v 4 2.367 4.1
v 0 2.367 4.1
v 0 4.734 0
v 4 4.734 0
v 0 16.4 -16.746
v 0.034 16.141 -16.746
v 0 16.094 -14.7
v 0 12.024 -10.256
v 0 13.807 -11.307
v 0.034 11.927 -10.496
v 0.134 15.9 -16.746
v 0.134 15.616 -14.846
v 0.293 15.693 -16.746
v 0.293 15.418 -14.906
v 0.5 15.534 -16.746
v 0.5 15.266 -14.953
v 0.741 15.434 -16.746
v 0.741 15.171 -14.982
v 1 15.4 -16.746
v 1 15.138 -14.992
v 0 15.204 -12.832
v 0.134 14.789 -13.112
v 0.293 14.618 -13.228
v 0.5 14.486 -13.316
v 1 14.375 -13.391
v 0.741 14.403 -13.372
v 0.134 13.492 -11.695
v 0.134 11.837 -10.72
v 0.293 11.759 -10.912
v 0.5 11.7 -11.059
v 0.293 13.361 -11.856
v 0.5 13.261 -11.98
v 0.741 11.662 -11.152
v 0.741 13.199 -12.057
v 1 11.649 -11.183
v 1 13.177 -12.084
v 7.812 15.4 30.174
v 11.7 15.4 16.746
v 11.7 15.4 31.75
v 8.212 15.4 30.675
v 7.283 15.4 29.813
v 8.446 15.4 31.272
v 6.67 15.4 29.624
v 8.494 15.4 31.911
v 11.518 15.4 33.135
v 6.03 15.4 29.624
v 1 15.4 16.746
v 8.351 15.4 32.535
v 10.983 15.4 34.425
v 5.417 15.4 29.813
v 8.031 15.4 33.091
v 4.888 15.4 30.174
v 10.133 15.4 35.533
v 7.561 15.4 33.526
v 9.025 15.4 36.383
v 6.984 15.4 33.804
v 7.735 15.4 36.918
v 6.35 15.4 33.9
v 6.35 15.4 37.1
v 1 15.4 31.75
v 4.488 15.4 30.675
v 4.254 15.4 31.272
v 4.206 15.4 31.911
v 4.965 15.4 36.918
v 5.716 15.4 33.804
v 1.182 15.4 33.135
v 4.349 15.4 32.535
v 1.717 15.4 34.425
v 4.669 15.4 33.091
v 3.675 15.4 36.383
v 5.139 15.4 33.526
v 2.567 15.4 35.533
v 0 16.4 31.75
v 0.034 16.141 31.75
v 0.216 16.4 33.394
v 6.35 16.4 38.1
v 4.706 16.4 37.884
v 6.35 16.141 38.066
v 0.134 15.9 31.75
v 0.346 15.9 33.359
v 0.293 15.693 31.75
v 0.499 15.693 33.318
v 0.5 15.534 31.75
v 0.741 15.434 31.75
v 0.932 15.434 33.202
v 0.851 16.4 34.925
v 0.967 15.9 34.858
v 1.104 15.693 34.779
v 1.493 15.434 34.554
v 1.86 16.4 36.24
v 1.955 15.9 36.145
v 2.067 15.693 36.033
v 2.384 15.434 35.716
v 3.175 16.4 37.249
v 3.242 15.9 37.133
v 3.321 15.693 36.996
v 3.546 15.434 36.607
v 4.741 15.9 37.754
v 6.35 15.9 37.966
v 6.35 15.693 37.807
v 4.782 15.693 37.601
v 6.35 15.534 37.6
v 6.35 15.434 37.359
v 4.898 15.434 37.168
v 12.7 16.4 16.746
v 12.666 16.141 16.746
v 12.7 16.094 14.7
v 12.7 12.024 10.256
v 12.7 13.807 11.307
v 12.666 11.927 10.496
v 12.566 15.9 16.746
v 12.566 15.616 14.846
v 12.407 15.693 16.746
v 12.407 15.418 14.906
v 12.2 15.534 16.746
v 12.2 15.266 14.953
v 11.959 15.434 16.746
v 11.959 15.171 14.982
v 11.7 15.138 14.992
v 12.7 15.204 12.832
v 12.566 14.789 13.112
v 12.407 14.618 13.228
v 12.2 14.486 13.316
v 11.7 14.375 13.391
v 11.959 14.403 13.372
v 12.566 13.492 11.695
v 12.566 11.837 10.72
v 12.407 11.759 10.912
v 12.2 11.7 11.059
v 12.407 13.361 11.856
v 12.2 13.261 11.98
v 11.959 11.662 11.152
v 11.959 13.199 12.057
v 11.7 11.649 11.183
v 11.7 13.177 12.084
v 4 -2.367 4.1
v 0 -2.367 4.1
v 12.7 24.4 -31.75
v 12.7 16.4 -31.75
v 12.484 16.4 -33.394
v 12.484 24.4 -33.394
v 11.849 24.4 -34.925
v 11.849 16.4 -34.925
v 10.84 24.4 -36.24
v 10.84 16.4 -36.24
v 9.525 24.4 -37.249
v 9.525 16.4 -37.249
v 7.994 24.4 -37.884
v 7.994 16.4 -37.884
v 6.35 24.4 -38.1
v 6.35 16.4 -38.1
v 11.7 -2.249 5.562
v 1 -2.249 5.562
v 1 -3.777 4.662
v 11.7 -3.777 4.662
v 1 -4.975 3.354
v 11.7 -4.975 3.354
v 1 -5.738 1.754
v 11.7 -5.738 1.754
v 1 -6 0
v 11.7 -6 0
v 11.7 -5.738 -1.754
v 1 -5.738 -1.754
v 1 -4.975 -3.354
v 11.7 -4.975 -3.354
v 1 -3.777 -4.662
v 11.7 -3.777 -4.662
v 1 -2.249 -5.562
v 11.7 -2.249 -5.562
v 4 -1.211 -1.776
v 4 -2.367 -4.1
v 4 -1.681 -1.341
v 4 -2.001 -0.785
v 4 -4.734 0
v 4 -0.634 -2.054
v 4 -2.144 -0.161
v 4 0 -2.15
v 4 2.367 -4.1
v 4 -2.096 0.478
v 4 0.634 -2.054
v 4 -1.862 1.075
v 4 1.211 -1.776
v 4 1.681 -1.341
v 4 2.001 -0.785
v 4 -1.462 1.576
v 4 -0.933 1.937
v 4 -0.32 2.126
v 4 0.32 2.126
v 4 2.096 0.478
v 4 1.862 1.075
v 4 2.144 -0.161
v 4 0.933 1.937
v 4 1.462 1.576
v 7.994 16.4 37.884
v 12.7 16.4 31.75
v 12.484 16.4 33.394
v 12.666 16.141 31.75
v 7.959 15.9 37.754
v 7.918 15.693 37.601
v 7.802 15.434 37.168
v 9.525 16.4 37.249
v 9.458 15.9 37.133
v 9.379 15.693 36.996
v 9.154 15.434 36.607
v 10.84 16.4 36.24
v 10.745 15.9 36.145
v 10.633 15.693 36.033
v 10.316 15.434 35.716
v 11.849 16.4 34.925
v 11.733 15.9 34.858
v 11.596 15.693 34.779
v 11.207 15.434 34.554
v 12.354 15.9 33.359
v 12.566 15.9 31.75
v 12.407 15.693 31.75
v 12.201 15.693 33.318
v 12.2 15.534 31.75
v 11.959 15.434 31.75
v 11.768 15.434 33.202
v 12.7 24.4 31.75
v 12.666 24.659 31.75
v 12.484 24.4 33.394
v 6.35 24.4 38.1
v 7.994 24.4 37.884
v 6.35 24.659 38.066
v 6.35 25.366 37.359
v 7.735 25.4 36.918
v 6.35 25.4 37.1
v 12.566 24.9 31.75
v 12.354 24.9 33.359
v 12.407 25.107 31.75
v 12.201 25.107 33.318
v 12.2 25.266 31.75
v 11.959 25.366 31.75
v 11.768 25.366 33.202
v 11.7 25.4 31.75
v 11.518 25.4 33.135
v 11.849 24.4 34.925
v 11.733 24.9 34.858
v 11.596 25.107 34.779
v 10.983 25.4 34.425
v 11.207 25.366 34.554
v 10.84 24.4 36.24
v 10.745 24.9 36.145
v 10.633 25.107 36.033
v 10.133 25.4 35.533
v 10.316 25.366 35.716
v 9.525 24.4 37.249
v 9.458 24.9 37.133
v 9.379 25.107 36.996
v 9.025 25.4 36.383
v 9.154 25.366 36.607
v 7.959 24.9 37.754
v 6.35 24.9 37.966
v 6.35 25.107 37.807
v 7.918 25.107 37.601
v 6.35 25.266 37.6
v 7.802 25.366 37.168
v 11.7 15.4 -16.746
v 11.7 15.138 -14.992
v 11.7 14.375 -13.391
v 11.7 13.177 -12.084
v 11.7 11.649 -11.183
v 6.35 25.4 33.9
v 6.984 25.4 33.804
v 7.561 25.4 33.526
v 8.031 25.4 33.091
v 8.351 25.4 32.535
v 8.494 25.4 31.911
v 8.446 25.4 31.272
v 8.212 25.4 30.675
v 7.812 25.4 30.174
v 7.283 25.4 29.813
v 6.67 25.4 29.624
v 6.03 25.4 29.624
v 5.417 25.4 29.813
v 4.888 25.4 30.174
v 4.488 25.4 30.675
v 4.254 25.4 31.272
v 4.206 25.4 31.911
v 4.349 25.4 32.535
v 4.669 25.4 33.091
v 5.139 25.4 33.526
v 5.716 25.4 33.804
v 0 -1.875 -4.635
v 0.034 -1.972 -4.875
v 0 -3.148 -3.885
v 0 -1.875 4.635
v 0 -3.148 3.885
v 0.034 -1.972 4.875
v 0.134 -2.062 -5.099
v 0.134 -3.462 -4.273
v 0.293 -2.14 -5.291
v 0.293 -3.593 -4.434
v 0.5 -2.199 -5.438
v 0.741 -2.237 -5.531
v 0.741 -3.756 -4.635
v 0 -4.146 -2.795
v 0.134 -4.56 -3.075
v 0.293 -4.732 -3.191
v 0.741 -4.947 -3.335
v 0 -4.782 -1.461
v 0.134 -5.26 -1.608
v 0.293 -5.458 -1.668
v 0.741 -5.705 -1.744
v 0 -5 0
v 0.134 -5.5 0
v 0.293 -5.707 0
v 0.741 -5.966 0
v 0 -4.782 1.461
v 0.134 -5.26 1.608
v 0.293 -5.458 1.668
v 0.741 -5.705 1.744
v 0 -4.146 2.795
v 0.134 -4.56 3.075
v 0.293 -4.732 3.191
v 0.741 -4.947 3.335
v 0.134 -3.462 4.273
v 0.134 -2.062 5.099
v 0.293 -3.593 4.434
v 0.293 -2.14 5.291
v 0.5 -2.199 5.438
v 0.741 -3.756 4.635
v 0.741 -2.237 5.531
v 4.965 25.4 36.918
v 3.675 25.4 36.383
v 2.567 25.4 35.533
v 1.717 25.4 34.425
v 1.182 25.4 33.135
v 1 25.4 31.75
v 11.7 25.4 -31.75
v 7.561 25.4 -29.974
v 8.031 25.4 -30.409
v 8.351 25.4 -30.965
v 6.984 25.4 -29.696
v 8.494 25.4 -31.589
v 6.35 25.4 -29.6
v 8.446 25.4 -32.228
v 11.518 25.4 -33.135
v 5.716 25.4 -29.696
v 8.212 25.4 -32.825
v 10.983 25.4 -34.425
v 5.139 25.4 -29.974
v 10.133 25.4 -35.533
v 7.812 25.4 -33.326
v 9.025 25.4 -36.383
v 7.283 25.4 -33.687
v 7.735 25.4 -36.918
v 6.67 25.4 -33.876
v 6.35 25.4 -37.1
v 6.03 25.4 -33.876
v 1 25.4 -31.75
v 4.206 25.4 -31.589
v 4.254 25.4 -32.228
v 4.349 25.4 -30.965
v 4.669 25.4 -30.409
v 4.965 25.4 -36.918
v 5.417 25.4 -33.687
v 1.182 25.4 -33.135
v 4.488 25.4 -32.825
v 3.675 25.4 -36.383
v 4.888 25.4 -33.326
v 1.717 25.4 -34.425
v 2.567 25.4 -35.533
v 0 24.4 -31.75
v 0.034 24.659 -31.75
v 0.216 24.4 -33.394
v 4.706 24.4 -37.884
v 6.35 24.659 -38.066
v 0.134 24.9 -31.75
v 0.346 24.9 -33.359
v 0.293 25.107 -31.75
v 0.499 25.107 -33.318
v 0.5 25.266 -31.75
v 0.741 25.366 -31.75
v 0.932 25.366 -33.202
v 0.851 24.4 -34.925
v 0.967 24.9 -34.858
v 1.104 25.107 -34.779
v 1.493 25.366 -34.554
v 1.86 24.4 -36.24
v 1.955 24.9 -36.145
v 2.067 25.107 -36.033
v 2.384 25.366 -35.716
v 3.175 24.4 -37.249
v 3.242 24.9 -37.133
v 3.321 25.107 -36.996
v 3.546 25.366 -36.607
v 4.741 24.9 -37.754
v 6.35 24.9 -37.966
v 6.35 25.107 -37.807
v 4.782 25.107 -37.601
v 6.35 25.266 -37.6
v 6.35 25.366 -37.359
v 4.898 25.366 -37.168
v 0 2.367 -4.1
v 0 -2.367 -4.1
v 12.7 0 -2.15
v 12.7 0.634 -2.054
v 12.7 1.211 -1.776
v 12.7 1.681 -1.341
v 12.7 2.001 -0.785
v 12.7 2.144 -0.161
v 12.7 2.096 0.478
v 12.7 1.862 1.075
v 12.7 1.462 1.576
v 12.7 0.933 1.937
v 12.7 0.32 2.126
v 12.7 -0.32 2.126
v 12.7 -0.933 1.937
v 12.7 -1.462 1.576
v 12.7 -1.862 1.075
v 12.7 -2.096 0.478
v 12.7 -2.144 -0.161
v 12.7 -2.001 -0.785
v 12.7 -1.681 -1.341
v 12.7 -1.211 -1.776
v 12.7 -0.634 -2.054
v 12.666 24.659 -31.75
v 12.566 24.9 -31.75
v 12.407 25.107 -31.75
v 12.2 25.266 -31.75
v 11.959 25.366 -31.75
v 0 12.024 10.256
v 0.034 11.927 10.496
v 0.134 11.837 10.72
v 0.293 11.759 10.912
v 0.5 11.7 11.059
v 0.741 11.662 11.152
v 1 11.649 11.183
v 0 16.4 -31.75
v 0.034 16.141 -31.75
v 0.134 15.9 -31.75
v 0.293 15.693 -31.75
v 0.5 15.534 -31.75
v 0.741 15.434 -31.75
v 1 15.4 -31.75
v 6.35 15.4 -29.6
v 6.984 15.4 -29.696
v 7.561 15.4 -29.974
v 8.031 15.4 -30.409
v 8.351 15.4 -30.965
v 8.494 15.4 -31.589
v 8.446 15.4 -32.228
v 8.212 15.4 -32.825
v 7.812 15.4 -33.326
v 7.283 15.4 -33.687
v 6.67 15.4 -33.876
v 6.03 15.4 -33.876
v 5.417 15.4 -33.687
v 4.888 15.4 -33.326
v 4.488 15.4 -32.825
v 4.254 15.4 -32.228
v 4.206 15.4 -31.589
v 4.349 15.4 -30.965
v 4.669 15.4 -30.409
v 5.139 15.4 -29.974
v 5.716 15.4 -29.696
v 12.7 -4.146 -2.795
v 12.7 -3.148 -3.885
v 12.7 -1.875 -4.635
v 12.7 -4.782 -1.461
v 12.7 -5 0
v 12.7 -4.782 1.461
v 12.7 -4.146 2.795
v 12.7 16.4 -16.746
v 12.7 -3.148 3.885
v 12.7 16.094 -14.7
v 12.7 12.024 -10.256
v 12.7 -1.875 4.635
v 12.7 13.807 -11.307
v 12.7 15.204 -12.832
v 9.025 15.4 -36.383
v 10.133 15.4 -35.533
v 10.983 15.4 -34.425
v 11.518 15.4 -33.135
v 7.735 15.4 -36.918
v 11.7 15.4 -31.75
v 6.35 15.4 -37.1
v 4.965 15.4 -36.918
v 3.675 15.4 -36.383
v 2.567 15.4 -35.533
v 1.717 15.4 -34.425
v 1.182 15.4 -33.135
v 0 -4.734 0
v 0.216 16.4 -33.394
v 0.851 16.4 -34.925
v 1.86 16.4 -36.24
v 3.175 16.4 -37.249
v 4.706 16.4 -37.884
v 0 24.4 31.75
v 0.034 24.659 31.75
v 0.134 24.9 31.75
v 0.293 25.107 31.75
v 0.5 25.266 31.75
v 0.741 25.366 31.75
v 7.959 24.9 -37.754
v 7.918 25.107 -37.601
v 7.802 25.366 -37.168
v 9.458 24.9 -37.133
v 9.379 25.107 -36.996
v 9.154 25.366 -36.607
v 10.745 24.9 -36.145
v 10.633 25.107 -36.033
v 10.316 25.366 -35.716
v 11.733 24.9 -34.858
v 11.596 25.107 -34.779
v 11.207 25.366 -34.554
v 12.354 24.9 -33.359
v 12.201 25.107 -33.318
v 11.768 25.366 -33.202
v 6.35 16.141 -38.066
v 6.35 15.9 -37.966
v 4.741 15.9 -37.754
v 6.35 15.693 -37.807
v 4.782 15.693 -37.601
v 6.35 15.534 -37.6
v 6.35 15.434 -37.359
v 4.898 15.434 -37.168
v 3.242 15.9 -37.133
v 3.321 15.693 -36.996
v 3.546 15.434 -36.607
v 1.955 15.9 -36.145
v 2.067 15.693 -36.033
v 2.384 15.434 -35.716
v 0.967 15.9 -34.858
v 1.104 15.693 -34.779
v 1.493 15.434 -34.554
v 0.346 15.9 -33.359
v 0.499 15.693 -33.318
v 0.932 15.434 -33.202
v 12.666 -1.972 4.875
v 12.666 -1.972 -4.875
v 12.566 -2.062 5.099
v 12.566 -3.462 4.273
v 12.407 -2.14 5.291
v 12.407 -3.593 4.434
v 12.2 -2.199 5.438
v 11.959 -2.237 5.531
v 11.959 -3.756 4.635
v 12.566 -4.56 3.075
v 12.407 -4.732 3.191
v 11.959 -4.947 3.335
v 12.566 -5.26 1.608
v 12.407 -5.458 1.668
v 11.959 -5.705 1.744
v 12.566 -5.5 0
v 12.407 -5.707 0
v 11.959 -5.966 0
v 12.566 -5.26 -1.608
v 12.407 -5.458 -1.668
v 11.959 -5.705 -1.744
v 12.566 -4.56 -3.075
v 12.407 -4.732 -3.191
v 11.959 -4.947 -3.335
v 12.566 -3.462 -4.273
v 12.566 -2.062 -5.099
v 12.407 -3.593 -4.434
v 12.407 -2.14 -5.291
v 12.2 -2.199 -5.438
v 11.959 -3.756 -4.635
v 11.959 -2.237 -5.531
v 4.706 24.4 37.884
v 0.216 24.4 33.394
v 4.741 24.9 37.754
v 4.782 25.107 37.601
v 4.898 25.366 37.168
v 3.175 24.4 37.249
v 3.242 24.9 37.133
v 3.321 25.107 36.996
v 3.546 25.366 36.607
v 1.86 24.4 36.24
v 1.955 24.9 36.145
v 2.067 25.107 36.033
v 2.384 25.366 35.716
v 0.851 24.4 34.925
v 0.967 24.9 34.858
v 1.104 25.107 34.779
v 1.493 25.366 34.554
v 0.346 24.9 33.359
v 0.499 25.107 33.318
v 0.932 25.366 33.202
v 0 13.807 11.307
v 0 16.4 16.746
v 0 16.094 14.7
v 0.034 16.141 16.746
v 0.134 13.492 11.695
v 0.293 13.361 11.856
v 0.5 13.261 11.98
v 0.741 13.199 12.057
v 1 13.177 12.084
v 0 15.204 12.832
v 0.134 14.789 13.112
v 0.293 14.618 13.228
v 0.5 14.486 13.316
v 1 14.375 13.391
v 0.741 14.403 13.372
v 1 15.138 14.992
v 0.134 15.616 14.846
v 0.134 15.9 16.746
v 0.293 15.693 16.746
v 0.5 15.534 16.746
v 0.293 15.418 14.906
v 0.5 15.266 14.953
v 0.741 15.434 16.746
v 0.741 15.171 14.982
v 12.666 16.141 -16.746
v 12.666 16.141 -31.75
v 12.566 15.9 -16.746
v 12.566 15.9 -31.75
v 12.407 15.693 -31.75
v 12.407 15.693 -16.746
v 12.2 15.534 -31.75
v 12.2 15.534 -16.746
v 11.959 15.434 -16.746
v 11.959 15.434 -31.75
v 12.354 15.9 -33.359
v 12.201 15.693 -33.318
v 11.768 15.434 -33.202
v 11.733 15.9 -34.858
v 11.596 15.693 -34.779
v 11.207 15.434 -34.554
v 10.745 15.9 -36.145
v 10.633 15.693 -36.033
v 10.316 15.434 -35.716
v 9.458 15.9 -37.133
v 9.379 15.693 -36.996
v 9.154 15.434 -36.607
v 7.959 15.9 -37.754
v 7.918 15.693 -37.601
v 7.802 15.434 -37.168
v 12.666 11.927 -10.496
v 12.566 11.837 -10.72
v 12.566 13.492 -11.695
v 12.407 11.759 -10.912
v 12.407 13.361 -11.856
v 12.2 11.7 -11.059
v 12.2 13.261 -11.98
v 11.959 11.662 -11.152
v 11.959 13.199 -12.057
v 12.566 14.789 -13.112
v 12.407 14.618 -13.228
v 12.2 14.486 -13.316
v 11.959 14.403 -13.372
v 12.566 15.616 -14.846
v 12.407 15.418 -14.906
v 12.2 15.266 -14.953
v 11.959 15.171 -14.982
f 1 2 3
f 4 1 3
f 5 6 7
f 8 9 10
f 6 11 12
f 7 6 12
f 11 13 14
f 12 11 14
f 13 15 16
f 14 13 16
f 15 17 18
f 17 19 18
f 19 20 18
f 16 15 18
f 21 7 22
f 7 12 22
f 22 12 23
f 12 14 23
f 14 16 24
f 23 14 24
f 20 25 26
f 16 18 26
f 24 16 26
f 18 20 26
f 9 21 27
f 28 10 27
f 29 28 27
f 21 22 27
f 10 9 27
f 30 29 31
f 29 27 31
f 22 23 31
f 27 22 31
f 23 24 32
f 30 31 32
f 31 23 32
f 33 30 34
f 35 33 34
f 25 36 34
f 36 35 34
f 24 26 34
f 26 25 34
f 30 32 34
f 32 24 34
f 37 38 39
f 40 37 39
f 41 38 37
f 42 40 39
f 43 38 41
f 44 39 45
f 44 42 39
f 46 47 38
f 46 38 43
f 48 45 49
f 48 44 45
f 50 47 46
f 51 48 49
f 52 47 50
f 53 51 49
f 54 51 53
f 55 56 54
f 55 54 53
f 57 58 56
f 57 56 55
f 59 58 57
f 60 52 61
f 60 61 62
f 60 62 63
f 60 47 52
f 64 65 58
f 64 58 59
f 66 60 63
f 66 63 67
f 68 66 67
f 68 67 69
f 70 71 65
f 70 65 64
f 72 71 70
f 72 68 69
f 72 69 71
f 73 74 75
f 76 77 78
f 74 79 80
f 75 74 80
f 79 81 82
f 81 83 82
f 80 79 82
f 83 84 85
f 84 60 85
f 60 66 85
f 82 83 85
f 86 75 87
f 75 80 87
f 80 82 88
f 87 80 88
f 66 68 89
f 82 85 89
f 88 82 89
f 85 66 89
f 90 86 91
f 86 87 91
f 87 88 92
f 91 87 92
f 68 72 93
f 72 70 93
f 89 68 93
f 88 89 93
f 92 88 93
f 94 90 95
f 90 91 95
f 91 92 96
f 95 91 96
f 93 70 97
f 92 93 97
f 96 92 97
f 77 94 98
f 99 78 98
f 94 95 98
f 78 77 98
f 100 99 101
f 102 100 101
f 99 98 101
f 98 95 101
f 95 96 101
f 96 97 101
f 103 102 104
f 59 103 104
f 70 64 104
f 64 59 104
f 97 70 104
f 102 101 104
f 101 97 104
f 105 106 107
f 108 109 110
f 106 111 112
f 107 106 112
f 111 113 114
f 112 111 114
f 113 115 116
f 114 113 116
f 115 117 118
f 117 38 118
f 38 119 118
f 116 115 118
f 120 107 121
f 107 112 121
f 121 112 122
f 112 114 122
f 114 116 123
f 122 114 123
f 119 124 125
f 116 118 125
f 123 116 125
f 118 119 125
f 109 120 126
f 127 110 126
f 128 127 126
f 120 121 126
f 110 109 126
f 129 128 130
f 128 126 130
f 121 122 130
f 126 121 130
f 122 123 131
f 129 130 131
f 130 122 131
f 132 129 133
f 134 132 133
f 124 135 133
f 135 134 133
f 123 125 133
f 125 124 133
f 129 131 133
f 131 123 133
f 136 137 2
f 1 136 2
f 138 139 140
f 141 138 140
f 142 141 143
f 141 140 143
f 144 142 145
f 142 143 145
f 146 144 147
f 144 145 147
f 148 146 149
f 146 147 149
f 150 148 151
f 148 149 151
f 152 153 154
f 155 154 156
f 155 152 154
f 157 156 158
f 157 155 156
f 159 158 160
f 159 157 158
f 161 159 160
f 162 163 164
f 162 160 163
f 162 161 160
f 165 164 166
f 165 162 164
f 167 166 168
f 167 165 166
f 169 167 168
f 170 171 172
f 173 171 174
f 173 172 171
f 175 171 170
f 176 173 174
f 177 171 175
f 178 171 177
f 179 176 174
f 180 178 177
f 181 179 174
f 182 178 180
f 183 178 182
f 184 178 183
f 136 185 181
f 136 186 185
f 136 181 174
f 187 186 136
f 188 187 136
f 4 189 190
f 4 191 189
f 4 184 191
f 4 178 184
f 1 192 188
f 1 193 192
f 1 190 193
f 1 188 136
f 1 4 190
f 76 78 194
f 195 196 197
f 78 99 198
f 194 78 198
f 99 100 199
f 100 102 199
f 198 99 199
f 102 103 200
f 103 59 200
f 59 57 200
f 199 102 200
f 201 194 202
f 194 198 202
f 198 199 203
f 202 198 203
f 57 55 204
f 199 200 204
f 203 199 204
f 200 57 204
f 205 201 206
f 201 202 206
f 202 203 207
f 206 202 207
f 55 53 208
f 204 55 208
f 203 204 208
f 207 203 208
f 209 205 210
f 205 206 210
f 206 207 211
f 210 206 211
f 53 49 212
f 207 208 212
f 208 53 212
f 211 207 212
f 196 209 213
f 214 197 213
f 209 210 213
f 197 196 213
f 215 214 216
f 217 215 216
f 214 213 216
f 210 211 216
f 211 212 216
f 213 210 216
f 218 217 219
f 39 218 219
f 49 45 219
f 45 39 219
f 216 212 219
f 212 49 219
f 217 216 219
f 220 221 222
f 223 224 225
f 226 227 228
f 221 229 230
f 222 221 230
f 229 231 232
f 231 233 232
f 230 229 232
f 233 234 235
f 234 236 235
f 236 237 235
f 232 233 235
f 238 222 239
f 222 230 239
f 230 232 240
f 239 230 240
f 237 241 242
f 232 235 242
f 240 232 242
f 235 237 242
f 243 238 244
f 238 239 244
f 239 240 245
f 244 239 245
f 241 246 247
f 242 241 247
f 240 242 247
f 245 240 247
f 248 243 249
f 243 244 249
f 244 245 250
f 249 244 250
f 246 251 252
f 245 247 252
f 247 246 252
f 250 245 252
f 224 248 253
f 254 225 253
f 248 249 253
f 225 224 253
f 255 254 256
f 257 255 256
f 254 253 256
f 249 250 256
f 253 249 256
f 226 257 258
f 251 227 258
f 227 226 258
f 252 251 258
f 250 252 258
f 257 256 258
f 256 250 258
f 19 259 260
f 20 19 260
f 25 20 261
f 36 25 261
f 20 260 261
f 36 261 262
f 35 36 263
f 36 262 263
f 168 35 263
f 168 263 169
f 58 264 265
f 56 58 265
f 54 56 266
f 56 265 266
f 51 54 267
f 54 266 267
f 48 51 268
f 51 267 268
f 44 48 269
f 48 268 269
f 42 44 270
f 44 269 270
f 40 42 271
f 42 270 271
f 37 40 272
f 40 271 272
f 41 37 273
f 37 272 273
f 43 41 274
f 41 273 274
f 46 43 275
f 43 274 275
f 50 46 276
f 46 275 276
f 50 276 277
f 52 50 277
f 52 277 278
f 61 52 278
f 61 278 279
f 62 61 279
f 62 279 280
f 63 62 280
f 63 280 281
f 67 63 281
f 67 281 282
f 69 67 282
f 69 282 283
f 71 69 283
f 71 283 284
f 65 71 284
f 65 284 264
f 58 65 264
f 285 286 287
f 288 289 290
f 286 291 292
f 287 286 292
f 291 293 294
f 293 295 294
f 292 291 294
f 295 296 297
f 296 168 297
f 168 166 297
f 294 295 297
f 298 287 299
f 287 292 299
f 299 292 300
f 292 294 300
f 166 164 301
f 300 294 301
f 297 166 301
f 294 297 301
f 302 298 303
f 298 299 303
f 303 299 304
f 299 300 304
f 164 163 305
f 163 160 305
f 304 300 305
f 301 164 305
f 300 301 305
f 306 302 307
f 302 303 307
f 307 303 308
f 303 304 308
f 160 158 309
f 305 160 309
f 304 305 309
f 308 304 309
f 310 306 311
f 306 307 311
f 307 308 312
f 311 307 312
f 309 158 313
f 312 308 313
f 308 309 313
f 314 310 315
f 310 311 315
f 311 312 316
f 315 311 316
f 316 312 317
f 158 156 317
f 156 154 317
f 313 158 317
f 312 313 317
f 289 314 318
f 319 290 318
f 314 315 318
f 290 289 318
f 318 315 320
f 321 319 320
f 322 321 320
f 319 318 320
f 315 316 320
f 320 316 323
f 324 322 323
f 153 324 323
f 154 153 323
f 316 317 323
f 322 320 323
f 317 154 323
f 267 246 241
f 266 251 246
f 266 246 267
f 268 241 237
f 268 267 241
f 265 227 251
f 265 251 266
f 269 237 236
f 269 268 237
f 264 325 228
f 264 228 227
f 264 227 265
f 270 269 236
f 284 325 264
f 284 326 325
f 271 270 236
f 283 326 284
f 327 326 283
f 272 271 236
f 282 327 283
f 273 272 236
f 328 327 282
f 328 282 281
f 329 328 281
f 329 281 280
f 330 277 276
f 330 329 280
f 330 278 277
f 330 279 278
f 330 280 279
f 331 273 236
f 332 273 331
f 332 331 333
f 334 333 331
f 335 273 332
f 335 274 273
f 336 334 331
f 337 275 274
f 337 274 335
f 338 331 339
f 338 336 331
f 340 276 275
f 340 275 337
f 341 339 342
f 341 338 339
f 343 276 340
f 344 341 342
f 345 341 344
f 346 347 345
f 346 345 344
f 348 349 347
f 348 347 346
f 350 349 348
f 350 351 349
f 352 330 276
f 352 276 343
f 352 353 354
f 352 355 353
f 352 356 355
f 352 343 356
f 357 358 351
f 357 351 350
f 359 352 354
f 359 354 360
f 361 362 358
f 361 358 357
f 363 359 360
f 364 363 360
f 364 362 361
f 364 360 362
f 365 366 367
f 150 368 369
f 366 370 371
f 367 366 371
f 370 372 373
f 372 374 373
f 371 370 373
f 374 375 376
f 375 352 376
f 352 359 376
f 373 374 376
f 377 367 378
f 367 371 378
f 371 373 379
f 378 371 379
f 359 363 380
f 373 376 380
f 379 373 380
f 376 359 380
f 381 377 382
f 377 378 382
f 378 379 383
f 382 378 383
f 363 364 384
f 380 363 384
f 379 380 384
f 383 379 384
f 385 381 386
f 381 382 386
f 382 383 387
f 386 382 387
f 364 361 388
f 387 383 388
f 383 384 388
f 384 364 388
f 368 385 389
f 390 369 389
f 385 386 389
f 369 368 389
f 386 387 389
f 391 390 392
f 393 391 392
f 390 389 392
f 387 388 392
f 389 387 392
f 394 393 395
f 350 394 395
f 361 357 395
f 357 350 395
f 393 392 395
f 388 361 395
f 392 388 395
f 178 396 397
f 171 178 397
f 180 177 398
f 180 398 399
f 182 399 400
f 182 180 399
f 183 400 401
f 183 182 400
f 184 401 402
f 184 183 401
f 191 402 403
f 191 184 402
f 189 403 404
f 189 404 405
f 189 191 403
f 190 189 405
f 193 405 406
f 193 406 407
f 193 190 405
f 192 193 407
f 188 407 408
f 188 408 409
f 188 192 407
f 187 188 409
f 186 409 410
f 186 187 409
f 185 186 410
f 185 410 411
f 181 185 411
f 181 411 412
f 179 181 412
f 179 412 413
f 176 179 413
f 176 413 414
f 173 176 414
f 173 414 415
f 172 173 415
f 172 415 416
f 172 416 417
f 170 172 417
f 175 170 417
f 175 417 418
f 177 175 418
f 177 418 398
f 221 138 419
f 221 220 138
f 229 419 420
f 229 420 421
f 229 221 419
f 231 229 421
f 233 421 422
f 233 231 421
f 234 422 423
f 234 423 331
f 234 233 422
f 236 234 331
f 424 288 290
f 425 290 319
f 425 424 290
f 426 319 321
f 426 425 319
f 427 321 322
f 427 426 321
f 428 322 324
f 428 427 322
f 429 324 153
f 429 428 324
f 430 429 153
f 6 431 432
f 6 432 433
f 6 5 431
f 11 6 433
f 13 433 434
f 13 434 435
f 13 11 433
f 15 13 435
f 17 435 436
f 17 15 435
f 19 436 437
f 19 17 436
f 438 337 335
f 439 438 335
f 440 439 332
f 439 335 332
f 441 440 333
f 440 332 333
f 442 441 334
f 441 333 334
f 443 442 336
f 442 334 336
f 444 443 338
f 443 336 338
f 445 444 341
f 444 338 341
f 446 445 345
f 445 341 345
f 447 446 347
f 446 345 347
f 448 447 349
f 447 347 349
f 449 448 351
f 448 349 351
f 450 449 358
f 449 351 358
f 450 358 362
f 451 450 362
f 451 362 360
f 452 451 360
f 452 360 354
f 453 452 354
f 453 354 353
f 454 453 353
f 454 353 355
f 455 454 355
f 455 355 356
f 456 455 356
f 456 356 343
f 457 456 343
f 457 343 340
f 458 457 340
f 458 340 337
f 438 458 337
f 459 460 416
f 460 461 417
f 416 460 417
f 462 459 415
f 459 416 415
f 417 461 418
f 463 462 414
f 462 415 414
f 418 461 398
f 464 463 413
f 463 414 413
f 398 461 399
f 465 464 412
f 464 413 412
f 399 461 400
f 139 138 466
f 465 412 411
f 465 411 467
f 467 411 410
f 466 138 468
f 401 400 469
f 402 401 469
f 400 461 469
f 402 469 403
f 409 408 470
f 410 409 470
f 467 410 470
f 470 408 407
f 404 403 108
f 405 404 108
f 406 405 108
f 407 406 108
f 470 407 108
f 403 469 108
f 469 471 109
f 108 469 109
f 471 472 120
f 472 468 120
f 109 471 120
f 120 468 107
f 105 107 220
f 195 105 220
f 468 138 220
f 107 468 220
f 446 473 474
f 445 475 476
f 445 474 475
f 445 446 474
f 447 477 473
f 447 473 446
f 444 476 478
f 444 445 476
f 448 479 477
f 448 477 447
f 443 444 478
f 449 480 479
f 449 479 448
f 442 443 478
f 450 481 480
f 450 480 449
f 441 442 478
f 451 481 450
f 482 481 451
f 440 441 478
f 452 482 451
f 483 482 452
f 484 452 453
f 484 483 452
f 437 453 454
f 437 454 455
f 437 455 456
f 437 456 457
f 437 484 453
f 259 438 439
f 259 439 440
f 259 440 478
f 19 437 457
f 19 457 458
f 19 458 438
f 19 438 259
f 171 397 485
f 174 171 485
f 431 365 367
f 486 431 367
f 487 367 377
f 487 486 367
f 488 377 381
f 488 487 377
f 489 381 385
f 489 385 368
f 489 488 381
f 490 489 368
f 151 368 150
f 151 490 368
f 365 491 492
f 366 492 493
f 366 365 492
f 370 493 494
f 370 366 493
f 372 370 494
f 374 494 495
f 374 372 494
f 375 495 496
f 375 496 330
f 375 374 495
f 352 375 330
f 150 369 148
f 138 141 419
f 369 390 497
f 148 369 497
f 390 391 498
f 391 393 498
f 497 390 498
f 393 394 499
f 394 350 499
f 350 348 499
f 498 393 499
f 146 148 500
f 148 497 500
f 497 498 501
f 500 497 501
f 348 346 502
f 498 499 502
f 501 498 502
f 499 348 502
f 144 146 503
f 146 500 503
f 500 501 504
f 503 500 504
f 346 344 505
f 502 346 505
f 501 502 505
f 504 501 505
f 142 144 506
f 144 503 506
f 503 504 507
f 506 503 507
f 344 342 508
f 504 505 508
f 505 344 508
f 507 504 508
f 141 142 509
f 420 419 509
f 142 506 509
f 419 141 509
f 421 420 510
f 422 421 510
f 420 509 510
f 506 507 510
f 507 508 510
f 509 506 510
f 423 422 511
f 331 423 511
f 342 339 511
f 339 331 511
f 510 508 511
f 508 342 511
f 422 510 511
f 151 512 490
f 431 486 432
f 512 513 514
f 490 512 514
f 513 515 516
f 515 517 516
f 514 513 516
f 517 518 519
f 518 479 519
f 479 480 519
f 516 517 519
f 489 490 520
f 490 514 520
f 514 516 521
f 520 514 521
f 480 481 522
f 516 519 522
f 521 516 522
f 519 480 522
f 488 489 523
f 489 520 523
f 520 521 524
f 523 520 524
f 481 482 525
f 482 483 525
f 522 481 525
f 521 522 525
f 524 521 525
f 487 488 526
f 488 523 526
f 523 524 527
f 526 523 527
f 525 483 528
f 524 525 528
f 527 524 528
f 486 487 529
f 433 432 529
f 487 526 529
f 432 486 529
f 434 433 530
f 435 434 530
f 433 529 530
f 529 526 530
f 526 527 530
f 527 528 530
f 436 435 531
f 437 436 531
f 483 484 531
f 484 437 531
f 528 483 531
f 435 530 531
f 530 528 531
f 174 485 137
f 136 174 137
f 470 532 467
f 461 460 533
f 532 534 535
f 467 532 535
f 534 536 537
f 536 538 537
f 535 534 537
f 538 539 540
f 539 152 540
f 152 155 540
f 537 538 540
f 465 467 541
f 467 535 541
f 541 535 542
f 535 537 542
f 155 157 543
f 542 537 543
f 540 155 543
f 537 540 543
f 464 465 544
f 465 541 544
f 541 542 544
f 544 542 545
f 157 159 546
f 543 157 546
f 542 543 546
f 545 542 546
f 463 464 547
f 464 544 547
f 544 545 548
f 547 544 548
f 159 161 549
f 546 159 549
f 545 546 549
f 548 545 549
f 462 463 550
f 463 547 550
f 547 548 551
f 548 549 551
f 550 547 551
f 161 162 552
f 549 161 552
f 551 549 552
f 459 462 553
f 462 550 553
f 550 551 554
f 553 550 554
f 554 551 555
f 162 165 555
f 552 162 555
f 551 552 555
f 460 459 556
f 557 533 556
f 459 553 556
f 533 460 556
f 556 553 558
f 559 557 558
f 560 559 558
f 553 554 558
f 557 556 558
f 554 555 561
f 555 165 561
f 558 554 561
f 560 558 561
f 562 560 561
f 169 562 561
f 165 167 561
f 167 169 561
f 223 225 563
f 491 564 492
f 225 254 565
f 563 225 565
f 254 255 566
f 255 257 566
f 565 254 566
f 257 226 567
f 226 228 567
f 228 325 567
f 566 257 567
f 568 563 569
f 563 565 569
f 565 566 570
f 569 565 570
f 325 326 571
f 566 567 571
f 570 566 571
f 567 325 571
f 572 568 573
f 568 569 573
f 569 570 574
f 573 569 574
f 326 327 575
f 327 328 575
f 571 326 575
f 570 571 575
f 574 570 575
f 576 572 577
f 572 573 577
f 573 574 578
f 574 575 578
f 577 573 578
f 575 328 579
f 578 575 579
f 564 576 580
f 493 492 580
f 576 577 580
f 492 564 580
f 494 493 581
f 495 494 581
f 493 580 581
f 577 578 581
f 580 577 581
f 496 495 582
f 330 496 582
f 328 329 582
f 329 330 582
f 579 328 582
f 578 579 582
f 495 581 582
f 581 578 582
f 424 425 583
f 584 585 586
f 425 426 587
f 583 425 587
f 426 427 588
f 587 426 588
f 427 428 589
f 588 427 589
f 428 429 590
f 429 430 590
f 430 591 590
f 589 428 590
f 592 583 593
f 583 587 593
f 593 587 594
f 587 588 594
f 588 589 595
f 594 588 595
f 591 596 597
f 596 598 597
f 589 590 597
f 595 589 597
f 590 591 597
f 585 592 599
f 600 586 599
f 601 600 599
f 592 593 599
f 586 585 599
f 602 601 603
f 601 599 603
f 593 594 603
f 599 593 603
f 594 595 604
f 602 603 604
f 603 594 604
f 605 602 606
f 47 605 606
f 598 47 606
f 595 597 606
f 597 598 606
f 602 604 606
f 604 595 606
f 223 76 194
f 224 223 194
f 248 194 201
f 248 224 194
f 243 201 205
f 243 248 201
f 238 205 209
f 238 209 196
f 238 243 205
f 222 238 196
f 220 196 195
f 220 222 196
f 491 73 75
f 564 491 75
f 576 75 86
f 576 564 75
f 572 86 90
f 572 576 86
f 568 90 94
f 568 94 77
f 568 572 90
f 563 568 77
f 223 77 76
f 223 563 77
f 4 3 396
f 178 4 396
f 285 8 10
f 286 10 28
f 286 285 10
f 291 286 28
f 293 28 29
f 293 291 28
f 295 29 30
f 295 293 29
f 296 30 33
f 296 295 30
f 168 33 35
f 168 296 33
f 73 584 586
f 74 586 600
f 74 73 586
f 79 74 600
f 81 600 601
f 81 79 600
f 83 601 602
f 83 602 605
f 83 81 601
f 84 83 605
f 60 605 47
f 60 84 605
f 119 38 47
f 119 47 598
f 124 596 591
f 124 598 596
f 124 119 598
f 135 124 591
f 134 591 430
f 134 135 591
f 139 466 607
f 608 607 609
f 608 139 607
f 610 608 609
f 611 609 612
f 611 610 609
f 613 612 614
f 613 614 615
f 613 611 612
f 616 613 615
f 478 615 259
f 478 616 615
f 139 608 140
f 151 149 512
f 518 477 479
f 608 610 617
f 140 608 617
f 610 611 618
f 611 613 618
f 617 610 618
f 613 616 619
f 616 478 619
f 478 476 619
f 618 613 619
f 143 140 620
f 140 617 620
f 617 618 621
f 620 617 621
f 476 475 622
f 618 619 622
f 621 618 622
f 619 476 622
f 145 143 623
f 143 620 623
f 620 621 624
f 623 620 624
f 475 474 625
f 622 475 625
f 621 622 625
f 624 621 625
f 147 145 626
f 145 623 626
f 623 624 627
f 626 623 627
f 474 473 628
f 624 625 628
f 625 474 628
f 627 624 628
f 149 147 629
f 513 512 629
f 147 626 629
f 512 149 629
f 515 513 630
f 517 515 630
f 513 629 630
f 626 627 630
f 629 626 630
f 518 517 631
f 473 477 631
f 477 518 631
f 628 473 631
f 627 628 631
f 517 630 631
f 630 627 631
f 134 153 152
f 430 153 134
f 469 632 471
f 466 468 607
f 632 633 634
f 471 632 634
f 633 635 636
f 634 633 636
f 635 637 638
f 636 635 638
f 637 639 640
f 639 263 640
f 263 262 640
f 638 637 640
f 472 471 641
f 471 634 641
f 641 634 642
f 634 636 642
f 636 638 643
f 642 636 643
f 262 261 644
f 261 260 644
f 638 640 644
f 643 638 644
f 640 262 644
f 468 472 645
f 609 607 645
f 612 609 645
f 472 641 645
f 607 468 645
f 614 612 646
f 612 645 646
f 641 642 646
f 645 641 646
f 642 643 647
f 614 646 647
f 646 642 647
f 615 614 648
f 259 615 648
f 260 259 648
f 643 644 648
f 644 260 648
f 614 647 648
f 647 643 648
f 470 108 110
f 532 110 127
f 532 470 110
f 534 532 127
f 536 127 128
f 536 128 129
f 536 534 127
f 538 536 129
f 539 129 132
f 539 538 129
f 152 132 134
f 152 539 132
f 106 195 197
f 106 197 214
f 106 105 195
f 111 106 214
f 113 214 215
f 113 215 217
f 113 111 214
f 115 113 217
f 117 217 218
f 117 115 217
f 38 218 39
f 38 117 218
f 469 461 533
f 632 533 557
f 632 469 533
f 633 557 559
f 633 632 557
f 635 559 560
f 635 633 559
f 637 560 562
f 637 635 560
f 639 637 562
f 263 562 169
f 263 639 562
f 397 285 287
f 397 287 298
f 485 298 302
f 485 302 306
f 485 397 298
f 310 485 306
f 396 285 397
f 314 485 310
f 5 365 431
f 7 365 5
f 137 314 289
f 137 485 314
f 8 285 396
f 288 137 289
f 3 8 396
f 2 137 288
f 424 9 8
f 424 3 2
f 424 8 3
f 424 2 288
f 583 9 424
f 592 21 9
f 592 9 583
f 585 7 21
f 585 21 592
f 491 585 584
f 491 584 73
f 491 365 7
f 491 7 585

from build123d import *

# Parameters (mm, degrees)
SKETCH1_R           = 2.15
BOSS_EXTRUDE1_DEPTH = 12.7
FILLET1_R           = 6
FILLET2_R           = 6.35
CUT_EXTRUDE1_REACH  = 52.979
SKETCH2_R           = 2.15
CUT_EXTRUDE2_DEPTH  = 4
FILLET3_R           = 1


with BuildPart() as part:
    # Sketch1 → Boss-Extrude1 (new body)
    with BuildSketch(Plane(origin=(0, 0, 0), x_dir=(0, 0, -1), z_dir=(1, 0, 0))):
        Polygon((-38.1, 25.4), (38.1, 25.4), (38.1, 15.4), (12.7, 15.4), (0, -16.003709137), (-12.7, 15.4), (-38.1, 15.4), align=None)
        Circle(SKETCH1_R, mode=Mode.SUBTRACT)
    extrude(amount=BOSS_EXTRUDE1_DEPTH)

    # Fillet1
    fillet1_edges = [part.edges().sort_by_distance(p)[0] for p in [
        (6.35, 15.4, -12.7),
        (6.35, -16.003709137, 0),
        (6.35, 15.4, 12.7),
    ]]
    fillet(fillet1_edges, radius=FILLET1_R)

    # Fillet2
    fillet2_edges = [part.edges().sort_by_distance(p)[0] for p in [
        (0, 20.4, -38.1),
        (12.7, 20.4, -38.1),
        (0, 20.4, 38.1),
        (12.7, 20.4, 38.1),
    ]]
    fillet(fillet2_edges, radius=FILLET2_R - 0.0001)  # a hair under: the kernel refuses the full size

    # Sketch2 → Cut-Extrude1 (cut, up to next)
    with BuildSketch(Plane(origin=(0, 25.4, 0), x_dir=(1, 0, 0), z_dir=(0, 1, 0)), mode=Mode.PRIVATE) as cut_extrude1_sk1:
        with Locations(Location((6.35, -31.75, 0), (0, 0, 270))):
            Circle(SKETCH2_R)
    cut_extrude1_tool1 = extrude(cut_extrude1_sk1.sketch, amount=-CUT_EXTRUDE1_REACH, mode=Mode.PRIVATE) & part.part
    # Sketch2 → Cut-Extrude1 (cut, up to next)
    with BuildSketch(Plane(origin=(0, 25.4, 0), x_dir=(1, 0, 0), z_dir=(0, 1, 0)), mode=Mode.PRIVATE) as cut_extrude1_sk2:
        with Locations(Location((6.35, 31.75, 0), (0, 0, 270))):
            Circle(SKETCH2_R)
    cut_extrude1_tool2 = extrude(cut_extrude1_sk2.sketch, amount=-CUT_EXTRUDE1_REACH, mode=Mode.PRIVATE) & part.part
    add(cut_extrude1_tool1.solids().sort_by_distance((6.35, 25.4, 31.75))[0], mode=Mode.SUBTRACT)
    add(cut_extrude1_tool2.solids().sort_by_distance((6.35, 25.4, -31.75))[0], mode=Mode.SUBTRACT)

    # Sketch3 → Cut-Extrude2 (cut)
    with BuildSketch(Plane.ZY):
        Polygon((0, 4.734272207), (-4.1, 2.367136104), (-4.1, -2.367136104), (0, -4.734272207), (4.1, -2.367136104), (4.1, 2.367136104), align=None)
    extrude(amount=-CUT_EXTRUDE2_DEPTH, mode=Mode.SUBTRACT)

    # Fillet3
    fillet3_edges = [part.edges().sort_by_distance(p)[0] for p in [
        (0, 15.4, -24.247854145),
        (12.7, 15.4, -24.247854145),
        (0, 4.7, -8.372804145),
        (12.7, 4.7, -8.372804145),
        (0, 4.7, 8.372804145),
        (12.7, 4.7, 8.372804145),
        (0, -6, 0),
        (12.7, -6, 0),
        (0, 14.374779952, -13.391273121),
        (12.7, 14.374779952, -13.391273121),
        (0, 14.374779952, 13.391273121),
        (12.7, 14.374779952, 13.391273121),
        (0, 25.4, 0),
        (12.7, 25.4, 0),
        (10.84015735, 25.4, 36.24015735),
        (1.85984265, 25.4, 36.24015735),
        (10.84015735, 25.4, -36.24015735),
        (1.85984265, 25.4, -36.24015735),
        (0, 15.4, 24.247854145),
        (10.84015735, 15.4, -36.24015735),
        (1.85984265, 15.4, -36.24015735),
        (12.7, 15.4, 24.247854145),
        (10.84015735, 15.4, 36.24015735),
        (1.85984265, 15.4, 36.24015735),
    ]]
    fillet(fillet3_edges, radius=FILLET3_R)


solid = part.part
